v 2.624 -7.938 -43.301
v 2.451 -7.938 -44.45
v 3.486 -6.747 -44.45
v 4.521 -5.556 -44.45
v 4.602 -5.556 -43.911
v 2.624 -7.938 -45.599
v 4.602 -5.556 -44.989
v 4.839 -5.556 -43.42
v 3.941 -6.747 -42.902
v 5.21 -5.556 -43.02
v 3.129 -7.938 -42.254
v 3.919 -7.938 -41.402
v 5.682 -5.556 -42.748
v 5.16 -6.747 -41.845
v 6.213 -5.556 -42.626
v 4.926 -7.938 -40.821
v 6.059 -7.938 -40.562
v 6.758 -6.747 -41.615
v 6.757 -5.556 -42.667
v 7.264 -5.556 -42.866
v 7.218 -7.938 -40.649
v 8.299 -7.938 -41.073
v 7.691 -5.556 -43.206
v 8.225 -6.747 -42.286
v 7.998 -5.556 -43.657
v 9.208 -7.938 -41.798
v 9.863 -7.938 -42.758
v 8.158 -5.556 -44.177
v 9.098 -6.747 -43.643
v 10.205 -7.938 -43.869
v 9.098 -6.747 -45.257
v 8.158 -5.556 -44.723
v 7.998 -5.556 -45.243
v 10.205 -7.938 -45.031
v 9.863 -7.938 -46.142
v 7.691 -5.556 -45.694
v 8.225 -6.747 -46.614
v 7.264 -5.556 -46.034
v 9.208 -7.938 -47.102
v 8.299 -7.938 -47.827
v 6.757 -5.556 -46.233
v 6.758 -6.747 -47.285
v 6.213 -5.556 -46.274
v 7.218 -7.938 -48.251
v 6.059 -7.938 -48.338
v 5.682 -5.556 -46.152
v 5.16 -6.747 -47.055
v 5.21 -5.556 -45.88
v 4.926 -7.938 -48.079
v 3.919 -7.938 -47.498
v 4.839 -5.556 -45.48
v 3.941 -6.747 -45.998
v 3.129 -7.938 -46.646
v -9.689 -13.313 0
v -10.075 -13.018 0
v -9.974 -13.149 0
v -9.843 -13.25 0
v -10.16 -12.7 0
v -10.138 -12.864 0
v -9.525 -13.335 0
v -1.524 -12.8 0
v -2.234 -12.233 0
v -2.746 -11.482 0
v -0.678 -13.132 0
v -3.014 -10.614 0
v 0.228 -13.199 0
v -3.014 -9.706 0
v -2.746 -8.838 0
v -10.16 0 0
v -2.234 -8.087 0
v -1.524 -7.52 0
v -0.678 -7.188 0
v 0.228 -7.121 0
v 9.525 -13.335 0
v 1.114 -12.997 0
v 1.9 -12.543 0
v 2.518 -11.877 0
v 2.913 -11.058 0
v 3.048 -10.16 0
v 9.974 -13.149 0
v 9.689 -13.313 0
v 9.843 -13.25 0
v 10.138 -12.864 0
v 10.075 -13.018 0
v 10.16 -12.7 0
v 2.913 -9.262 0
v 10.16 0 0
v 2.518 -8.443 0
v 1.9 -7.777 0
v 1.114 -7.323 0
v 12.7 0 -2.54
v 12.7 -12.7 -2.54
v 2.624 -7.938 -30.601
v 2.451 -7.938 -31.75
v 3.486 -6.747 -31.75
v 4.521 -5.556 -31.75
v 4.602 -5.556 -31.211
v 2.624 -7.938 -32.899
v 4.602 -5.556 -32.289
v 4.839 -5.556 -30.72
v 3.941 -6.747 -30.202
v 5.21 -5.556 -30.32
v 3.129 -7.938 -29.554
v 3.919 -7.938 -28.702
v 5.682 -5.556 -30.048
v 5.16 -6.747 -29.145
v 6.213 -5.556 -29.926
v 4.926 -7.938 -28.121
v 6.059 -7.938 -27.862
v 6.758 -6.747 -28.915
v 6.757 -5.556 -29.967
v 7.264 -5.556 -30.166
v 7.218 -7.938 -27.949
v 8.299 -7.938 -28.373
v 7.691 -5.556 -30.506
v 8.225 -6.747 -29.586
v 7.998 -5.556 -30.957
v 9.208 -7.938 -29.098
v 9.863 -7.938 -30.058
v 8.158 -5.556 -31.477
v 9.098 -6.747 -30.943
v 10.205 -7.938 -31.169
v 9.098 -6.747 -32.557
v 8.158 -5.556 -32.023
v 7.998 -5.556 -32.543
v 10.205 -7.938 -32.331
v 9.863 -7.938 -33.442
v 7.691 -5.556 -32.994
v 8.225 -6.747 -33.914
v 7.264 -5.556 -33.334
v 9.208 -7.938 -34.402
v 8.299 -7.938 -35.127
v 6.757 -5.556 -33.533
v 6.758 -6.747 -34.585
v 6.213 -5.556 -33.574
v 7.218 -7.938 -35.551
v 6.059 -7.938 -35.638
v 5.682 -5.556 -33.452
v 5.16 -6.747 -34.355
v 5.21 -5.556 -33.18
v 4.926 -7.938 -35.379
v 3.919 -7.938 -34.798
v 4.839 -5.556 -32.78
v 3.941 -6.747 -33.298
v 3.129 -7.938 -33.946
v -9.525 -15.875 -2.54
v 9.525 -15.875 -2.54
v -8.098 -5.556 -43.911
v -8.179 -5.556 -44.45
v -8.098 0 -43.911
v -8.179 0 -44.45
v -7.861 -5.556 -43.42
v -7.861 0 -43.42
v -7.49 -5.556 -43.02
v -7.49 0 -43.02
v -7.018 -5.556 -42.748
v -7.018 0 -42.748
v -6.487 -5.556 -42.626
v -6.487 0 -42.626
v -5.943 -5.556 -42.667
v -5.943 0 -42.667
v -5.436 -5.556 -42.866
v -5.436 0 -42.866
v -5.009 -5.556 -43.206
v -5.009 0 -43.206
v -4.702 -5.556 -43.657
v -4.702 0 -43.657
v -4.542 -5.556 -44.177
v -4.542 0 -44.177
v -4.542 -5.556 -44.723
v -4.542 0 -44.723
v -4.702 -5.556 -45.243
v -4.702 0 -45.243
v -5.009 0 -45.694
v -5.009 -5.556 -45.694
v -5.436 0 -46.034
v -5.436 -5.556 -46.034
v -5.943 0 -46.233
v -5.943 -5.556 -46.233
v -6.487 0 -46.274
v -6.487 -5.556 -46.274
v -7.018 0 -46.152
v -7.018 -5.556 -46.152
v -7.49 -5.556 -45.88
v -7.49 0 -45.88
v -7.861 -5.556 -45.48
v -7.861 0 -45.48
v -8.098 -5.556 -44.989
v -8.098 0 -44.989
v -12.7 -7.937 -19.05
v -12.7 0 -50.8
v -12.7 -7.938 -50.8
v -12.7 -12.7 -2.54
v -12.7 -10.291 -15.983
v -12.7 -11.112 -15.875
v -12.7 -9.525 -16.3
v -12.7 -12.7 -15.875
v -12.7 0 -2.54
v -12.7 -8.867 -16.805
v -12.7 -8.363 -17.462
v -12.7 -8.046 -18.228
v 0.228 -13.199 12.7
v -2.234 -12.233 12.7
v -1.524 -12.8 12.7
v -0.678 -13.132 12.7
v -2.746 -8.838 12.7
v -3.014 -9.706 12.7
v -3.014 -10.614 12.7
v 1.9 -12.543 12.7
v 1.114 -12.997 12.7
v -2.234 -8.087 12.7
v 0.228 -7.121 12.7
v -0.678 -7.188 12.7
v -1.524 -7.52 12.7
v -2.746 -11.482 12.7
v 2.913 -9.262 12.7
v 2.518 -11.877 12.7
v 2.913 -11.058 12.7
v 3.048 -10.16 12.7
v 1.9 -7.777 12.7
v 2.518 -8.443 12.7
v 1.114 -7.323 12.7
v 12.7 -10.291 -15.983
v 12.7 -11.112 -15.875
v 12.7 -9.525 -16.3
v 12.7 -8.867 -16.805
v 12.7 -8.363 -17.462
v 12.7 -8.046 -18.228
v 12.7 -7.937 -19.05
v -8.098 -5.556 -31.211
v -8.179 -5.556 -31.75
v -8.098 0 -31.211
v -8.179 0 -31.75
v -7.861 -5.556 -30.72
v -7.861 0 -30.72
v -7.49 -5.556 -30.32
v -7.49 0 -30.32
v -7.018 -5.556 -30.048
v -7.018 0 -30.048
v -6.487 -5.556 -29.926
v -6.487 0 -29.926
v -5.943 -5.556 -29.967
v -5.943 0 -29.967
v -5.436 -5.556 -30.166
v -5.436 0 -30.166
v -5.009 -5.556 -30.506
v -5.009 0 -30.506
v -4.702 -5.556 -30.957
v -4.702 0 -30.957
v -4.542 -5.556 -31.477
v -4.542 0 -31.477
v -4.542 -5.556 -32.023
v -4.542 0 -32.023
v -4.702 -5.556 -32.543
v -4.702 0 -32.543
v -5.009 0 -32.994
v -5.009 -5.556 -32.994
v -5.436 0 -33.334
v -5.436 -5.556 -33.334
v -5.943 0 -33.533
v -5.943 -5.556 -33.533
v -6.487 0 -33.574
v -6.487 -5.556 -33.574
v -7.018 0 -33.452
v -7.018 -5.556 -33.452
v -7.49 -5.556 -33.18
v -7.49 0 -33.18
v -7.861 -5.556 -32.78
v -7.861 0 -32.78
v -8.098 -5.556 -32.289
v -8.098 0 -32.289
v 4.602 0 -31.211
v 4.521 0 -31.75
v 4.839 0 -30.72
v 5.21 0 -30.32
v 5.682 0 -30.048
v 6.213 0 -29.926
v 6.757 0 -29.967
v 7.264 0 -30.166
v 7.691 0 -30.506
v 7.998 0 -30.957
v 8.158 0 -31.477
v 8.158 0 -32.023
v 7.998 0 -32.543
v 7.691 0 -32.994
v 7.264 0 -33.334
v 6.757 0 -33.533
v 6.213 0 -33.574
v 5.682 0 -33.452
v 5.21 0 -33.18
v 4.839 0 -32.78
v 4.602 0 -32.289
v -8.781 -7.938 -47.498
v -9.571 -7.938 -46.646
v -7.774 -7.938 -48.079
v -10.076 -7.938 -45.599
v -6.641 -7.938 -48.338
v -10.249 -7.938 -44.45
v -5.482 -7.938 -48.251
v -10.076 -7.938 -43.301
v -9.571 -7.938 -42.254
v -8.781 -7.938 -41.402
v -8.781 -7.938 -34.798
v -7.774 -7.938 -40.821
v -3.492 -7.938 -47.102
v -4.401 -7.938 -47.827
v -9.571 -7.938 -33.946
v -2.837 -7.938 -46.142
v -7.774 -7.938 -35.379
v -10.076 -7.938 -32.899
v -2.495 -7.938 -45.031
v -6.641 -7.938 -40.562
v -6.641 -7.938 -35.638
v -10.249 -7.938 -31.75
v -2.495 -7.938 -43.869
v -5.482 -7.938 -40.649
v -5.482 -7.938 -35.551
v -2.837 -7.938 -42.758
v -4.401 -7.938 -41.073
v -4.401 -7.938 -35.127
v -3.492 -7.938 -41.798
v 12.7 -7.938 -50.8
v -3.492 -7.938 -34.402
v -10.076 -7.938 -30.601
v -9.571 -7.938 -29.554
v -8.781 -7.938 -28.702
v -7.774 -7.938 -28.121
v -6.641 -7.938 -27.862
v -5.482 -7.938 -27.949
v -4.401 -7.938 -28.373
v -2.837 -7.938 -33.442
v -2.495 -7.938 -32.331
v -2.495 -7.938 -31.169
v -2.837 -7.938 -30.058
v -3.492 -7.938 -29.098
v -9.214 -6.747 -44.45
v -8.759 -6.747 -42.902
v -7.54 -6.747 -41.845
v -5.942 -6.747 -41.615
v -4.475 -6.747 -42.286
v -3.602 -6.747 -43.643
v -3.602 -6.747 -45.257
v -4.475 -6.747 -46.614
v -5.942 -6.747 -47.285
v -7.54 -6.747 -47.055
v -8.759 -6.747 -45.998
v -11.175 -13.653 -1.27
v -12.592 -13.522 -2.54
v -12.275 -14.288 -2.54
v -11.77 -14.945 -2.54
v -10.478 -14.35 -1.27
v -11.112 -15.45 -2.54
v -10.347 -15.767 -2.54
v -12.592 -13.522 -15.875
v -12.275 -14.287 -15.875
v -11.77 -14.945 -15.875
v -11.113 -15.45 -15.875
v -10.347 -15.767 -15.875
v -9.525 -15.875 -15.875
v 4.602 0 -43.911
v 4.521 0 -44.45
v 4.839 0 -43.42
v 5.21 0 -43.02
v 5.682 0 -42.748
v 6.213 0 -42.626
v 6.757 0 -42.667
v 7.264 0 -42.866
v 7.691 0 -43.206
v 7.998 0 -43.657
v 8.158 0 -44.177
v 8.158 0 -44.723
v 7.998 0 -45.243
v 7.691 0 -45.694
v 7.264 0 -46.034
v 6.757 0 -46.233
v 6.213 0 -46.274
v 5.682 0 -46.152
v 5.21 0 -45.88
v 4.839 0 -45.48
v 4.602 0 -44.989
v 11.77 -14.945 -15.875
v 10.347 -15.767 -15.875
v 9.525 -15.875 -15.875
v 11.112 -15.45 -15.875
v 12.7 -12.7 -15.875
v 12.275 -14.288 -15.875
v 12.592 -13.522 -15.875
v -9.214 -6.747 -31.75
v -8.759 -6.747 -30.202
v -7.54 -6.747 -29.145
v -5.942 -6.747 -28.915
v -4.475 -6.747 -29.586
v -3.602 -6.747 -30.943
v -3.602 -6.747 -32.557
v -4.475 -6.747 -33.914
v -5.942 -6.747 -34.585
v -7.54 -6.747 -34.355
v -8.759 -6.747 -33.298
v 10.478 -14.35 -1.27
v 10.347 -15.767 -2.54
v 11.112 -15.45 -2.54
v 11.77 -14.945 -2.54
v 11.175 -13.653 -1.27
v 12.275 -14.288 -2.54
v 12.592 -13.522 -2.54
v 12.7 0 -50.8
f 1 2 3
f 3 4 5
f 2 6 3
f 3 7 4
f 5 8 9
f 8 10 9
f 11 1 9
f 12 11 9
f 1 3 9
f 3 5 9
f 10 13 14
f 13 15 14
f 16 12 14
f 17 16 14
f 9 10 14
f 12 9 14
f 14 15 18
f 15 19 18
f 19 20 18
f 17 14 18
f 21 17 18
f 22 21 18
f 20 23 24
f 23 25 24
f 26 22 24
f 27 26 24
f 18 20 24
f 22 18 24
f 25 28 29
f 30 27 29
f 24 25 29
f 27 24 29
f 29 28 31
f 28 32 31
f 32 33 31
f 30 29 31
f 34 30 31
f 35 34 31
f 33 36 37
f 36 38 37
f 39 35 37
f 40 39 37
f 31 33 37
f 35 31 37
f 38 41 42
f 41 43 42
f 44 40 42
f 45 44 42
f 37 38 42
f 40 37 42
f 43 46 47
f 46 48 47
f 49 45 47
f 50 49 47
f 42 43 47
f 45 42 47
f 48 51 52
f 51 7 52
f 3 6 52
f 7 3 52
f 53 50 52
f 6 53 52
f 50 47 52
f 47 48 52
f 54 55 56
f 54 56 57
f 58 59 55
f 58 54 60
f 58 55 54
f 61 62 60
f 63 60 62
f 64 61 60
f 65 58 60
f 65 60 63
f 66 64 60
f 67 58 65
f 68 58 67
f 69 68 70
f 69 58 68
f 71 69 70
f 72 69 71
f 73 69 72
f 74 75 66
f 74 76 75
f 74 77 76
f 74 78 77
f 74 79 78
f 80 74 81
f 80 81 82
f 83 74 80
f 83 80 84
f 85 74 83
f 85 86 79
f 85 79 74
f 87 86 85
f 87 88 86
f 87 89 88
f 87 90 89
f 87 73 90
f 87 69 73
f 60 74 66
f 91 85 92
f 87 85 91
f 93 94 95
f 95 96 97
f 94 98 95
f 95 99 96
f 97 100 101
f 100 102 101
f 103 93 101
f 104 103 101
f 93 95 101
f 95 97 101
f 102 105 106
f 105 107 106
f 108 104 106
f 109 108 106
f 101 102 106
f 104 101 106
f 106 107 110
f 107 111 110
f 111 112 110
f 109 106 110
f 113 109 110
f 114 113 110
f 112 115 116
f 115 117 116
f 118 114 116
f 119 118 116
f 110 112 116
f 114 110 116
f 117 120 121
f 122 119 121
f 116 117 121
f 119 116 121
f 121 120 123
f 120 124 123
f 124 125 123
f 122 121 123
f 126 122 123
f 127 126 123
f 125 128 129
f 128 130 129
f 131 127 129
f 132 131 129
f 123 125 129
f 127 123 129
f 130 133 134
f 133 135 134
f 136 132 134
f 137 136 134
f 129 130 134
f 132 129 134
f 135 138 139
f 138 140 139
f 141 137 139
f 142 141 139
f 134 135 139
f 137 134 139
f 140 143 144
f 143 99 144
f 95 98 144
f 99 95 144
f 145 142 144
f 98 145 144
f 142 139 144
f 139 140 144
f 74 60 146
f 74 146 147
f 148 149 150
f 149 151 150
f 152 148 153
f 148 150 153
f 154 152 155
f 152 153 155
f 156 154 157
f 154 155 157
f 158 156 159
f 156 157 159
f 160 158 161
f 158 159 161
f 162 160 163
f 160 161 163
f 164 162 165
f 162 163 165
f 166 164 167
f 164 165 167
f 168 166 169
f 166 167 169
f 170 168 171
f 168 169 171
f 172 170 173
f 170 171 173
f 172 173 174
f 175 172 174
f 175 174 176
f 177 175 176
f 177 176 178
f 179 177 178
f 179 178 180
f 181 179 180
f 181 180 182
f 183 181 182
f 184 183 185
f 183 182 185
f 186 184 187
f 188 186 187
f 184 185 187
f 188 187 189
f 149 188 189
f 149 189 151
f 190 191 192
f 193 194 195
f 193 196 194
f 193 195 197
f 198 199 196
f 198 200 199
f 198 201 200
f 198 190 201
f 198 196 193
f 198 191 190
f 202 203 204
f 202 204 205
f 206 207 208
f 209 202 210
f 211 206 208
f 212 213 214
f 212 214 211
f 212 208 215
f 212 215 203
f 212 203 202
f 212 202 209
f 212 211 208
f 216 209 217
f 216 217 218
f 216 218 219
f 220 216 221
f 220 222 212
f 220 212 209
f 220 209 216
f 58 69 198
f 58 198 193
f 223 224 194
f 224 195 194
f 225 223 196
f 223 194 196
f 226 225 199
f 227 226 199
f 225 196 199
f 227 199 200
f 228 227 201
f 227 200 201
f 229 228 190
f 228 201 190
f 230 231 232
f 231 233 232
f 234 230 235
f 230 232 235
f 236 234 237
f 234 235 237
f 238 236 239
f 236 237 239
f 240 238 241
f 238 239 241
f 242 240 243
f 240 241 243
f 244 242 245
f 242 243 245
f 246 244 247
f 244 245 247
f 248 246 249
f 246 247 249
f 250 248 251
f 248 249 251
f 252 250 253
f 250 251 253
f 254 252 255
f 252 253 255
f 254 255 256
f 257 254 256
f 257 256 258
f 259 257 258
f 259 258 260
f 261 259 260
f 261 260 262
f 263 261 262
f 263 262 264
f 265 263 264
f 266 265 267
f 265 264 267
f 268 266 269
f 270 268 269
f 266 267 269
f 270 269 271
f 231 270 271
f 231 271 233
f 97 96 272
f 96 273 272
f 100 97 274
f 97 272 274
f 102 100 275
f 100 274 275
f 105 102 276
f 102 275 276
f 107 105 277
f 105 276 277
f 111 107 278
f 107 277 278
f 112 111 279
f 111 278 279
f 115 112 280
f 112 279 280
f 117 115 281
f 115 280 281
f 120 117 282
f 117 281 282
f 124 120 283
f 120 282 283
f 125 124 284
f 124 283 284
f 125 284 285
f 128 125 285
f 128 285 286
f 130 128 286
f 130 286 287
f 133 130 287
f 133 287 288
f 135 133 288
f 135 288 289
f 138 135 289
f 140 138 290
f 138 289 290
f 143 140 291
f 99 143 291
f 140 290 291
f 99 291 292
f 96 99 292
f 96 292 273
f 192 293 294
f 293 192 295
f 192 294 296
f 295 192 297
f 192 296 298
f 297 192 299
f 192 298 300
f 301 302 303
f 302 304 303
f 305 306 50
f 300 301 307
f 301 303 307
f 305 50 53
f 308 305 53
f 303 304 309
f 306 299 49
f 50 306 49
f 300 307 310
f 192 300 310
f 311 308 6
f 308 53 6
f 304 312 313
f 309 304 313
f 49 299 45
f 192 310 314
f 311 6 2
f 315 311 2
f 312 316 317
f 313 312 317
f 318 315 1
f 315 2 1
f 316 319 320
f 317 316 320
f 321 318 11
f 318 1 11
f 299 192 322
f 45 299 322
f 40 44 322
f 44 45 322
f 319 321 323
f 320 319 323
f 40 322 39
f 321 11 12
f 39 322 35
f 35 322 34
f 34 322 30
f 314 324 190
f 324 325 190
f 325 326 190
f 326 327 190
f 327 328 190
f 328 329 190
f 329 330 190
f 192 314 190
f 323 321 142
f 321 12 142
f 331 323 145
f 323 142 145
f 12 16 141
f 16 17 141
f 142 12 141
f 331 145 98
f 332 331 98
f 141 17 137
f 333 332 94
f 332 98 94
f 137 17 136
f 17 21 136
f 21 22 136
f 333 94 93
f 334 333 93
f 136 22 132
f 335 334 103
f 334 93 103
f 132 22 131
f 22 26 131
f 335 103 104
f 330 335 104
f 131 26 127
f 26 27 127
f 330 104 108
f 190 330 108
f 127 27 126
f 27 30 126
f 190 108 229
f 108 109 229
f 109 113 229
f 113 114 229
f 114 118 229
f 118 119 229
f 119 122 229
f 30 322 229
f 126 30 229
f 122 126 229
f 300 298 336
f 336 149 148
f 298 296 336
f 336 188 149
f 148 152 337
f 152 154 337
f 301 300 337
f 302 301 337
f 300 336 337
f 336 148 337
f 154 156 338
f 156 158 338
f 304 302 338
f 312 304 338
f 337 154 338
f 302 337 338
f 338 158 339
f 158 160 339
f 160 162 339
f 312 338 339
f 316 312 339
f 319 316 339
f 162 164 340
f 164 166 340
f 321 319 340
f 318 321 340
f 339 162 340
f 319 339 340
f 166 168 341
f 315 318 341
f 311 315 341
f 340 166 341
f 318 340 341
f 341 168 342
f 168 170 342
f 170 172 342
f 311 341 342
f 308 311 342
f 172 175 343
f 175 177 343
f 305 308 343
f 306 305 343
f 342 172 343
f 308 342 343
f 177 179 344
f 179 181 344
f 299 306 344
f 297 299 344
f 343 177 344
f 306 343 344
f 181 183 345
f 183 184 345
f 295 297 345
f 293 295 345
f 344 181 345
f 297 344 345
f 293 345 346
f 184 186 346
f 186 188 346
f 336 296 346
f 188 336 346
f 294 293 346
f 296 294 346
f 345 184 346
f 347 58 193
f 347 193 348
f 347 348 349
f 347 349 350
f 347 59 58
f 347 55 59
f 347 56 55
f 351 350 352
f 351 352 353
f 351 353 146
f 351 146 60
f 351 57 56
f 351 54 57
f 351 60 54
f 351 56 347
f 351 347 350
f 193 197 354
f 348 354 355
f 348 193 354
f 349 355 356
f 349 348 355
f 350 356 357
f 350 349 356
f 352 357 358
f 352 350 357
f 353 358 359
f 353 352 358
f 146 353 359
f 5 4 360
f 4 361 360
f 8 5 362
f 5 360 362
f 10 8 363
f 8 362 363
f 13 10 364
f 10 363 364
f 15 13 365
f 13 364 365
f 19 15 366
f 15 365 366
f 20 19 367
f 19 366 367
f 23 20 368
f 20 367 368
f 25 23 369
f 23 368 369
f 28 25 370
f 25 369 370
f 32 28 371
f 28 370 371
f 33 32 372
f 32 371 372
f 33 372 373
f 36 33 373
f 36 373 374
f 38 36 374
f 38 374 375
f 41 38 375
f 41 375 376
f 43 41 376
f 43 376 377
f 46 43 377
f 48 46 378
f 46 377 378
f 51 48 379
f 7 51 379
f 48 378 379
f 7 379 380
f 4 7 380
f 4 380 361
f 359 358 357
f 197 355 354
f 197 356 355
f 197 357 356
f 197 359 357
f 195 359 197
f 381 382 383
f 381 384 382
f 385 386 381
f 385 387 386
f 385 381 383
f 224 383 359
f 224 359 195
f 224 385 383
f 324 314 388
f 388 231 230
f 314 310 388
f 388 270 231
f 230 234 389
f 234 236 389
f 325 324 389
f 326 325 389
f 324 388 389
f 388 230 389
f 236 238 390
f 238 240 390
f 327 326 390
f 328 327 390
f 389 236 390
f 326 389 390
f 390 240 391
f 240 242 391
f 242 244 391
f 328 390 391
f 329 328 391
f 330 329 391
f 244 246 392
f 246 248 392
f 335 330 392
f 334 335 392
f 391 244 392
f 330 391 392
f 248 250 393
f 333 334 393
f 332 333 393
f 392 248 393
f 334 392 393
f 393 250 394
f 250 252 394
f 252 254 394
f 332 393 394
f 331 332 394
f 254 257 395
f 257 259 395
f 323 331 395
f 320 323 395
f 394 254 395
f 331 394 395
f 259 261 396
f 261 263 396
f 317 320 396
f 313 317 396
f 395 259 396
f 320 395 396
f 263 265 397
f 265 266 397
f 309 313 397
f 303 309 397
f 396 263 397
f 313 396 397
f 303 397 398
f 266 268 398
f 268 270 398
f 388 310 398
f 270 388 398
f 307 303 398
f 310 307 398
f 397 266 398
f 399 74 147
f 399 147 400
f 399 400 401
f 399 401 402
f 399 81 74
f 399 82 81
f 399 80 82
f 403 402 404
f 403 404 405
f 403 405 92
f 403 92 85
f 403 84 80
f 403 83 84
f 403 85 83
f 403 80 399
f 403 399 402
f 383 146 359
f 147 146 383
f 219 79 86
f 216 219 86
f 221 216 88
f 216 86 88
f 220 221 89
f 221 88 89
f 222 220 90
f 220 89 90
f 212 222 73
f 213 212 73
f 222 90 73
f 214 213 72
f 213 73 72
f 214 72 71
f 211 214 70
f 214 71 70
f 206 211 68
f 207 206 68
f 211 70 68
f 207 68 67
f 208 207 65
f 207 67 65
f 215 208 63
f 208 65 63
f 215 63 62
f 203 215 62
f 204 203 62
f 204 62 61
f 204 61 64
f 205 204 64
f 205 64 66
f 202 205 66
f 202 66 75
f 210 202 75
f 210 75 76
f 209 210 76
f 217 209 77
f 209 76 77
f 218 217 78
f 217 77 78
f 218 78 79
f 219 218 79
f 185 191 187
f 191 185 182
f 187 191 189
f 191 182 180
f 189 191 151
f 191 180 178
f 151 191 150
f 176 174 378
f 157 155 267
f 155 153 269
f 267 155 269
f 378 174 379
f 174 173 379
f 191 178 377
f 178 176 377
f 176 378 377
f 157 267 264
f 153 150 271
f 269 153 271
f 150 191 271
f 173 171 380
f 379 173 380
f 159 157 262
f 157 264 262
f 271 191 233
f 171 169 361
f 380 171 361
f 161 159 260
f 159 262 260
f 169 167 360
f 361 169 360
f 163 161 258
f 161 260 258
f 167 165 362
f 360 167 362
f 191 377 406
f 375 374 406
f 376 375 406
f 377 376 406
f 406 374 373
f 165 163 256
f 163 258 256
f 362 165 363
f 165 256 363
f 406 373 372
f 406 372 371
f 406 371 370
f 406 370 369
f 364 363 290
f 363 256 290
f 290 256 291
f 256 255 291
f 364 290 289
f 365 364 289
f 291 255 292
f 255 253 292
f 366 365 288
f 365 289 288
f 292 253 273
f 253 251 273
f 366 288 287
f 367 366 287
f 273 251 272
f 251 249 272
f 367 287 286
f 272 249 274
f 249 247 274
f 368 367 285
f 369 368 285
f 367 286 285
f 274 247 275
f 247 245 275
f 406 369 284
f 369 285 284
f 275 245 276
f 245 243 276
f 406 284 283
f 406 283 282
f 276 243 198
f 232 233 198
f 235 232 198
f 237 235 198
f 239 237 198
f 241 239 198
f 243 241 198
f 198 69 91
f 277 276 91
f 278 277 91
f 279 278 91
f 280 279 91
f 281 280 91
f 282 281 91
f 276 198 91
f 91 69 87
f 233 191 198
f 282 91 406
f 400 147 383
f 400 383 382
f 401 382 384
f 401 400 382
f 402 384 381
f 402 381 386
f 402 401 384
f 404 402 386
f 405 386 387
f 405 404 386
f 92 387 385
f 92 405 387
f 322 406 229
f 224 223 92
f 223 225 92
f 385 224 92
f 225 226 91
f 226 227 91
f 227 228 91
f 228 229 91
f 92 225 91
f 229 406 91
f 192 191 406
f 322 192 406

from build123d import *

# Parameters (mm, degrees)
F0_W           = 25.4
F0_H           = 50.8
F1_DEPTH       = 15.875
F2_R           = 3.048
F3_DEPTH       = 12.7
F4_W           = 7.9375
F4_H           = 34.925
F5_DEPTH       = 25.4
F6_R           = 3.175
F8_D           = 3.6576
F8_CSINK_D     = 7.7978
F8_CSINK_ANGLE = 82
F9_SIZE        = 2.54


with BuildPart() as f1:
    # F0 (on Front) → F1 (new body)
    with BuildSketch(Plane.XZ):
        with Locations((0, -25.4)):
            Rectangle(F0_W, F0_H)
    extrude(amount=F1_DEPTH)

    # F2 (on face) → F3 (join)
    with BuildSketch(Plane.XY):
        with Locations((0, -10.16)):
            Circle(F2_R)
    extrude(amount=F3_DEPTH)

    # F4 (on face) → F5 (cut, through all)
    with BuildSketch(Plane.YZ.offset(12.7)):
        with Locations((-11.90625, -33.3375)):
            Rectangle(F4_W, F4_H)
    extrude(amount=-F5_DEPTH, mode=Mode.SUBTRACT)

    # F6
    f6_edges = [f1.edges().sort_by_distance(p)[0] for p in [
        (12.7, -15.875, -7.9375),
        (-12.7, -15.875, -7.9375),
        (0, -7.9375, -15.875),
    ]]
    fillet(f6_edges, radius=F6_R)

    # F8 (through all)
    with Locations(Plane.XZ.offset(7.9375)):
        with Locations((-6.35, -31.75), (6.35, -31.75), (6.35, -44.45), (-6.35, -44.45)):
            CounterSinkHole(F8_D / 2, F8_CSINK_D / 2, counter_sink_angle=F8_CSINK_ANGLE)

    # F9
    f9_edges = [f1.edges().sort_by_distance(p)[0] for p in [
        (0, -15.875, 0),
    ]]
    chamfer(f9_edges, length=F9_SIZE)


solid = f1.part
